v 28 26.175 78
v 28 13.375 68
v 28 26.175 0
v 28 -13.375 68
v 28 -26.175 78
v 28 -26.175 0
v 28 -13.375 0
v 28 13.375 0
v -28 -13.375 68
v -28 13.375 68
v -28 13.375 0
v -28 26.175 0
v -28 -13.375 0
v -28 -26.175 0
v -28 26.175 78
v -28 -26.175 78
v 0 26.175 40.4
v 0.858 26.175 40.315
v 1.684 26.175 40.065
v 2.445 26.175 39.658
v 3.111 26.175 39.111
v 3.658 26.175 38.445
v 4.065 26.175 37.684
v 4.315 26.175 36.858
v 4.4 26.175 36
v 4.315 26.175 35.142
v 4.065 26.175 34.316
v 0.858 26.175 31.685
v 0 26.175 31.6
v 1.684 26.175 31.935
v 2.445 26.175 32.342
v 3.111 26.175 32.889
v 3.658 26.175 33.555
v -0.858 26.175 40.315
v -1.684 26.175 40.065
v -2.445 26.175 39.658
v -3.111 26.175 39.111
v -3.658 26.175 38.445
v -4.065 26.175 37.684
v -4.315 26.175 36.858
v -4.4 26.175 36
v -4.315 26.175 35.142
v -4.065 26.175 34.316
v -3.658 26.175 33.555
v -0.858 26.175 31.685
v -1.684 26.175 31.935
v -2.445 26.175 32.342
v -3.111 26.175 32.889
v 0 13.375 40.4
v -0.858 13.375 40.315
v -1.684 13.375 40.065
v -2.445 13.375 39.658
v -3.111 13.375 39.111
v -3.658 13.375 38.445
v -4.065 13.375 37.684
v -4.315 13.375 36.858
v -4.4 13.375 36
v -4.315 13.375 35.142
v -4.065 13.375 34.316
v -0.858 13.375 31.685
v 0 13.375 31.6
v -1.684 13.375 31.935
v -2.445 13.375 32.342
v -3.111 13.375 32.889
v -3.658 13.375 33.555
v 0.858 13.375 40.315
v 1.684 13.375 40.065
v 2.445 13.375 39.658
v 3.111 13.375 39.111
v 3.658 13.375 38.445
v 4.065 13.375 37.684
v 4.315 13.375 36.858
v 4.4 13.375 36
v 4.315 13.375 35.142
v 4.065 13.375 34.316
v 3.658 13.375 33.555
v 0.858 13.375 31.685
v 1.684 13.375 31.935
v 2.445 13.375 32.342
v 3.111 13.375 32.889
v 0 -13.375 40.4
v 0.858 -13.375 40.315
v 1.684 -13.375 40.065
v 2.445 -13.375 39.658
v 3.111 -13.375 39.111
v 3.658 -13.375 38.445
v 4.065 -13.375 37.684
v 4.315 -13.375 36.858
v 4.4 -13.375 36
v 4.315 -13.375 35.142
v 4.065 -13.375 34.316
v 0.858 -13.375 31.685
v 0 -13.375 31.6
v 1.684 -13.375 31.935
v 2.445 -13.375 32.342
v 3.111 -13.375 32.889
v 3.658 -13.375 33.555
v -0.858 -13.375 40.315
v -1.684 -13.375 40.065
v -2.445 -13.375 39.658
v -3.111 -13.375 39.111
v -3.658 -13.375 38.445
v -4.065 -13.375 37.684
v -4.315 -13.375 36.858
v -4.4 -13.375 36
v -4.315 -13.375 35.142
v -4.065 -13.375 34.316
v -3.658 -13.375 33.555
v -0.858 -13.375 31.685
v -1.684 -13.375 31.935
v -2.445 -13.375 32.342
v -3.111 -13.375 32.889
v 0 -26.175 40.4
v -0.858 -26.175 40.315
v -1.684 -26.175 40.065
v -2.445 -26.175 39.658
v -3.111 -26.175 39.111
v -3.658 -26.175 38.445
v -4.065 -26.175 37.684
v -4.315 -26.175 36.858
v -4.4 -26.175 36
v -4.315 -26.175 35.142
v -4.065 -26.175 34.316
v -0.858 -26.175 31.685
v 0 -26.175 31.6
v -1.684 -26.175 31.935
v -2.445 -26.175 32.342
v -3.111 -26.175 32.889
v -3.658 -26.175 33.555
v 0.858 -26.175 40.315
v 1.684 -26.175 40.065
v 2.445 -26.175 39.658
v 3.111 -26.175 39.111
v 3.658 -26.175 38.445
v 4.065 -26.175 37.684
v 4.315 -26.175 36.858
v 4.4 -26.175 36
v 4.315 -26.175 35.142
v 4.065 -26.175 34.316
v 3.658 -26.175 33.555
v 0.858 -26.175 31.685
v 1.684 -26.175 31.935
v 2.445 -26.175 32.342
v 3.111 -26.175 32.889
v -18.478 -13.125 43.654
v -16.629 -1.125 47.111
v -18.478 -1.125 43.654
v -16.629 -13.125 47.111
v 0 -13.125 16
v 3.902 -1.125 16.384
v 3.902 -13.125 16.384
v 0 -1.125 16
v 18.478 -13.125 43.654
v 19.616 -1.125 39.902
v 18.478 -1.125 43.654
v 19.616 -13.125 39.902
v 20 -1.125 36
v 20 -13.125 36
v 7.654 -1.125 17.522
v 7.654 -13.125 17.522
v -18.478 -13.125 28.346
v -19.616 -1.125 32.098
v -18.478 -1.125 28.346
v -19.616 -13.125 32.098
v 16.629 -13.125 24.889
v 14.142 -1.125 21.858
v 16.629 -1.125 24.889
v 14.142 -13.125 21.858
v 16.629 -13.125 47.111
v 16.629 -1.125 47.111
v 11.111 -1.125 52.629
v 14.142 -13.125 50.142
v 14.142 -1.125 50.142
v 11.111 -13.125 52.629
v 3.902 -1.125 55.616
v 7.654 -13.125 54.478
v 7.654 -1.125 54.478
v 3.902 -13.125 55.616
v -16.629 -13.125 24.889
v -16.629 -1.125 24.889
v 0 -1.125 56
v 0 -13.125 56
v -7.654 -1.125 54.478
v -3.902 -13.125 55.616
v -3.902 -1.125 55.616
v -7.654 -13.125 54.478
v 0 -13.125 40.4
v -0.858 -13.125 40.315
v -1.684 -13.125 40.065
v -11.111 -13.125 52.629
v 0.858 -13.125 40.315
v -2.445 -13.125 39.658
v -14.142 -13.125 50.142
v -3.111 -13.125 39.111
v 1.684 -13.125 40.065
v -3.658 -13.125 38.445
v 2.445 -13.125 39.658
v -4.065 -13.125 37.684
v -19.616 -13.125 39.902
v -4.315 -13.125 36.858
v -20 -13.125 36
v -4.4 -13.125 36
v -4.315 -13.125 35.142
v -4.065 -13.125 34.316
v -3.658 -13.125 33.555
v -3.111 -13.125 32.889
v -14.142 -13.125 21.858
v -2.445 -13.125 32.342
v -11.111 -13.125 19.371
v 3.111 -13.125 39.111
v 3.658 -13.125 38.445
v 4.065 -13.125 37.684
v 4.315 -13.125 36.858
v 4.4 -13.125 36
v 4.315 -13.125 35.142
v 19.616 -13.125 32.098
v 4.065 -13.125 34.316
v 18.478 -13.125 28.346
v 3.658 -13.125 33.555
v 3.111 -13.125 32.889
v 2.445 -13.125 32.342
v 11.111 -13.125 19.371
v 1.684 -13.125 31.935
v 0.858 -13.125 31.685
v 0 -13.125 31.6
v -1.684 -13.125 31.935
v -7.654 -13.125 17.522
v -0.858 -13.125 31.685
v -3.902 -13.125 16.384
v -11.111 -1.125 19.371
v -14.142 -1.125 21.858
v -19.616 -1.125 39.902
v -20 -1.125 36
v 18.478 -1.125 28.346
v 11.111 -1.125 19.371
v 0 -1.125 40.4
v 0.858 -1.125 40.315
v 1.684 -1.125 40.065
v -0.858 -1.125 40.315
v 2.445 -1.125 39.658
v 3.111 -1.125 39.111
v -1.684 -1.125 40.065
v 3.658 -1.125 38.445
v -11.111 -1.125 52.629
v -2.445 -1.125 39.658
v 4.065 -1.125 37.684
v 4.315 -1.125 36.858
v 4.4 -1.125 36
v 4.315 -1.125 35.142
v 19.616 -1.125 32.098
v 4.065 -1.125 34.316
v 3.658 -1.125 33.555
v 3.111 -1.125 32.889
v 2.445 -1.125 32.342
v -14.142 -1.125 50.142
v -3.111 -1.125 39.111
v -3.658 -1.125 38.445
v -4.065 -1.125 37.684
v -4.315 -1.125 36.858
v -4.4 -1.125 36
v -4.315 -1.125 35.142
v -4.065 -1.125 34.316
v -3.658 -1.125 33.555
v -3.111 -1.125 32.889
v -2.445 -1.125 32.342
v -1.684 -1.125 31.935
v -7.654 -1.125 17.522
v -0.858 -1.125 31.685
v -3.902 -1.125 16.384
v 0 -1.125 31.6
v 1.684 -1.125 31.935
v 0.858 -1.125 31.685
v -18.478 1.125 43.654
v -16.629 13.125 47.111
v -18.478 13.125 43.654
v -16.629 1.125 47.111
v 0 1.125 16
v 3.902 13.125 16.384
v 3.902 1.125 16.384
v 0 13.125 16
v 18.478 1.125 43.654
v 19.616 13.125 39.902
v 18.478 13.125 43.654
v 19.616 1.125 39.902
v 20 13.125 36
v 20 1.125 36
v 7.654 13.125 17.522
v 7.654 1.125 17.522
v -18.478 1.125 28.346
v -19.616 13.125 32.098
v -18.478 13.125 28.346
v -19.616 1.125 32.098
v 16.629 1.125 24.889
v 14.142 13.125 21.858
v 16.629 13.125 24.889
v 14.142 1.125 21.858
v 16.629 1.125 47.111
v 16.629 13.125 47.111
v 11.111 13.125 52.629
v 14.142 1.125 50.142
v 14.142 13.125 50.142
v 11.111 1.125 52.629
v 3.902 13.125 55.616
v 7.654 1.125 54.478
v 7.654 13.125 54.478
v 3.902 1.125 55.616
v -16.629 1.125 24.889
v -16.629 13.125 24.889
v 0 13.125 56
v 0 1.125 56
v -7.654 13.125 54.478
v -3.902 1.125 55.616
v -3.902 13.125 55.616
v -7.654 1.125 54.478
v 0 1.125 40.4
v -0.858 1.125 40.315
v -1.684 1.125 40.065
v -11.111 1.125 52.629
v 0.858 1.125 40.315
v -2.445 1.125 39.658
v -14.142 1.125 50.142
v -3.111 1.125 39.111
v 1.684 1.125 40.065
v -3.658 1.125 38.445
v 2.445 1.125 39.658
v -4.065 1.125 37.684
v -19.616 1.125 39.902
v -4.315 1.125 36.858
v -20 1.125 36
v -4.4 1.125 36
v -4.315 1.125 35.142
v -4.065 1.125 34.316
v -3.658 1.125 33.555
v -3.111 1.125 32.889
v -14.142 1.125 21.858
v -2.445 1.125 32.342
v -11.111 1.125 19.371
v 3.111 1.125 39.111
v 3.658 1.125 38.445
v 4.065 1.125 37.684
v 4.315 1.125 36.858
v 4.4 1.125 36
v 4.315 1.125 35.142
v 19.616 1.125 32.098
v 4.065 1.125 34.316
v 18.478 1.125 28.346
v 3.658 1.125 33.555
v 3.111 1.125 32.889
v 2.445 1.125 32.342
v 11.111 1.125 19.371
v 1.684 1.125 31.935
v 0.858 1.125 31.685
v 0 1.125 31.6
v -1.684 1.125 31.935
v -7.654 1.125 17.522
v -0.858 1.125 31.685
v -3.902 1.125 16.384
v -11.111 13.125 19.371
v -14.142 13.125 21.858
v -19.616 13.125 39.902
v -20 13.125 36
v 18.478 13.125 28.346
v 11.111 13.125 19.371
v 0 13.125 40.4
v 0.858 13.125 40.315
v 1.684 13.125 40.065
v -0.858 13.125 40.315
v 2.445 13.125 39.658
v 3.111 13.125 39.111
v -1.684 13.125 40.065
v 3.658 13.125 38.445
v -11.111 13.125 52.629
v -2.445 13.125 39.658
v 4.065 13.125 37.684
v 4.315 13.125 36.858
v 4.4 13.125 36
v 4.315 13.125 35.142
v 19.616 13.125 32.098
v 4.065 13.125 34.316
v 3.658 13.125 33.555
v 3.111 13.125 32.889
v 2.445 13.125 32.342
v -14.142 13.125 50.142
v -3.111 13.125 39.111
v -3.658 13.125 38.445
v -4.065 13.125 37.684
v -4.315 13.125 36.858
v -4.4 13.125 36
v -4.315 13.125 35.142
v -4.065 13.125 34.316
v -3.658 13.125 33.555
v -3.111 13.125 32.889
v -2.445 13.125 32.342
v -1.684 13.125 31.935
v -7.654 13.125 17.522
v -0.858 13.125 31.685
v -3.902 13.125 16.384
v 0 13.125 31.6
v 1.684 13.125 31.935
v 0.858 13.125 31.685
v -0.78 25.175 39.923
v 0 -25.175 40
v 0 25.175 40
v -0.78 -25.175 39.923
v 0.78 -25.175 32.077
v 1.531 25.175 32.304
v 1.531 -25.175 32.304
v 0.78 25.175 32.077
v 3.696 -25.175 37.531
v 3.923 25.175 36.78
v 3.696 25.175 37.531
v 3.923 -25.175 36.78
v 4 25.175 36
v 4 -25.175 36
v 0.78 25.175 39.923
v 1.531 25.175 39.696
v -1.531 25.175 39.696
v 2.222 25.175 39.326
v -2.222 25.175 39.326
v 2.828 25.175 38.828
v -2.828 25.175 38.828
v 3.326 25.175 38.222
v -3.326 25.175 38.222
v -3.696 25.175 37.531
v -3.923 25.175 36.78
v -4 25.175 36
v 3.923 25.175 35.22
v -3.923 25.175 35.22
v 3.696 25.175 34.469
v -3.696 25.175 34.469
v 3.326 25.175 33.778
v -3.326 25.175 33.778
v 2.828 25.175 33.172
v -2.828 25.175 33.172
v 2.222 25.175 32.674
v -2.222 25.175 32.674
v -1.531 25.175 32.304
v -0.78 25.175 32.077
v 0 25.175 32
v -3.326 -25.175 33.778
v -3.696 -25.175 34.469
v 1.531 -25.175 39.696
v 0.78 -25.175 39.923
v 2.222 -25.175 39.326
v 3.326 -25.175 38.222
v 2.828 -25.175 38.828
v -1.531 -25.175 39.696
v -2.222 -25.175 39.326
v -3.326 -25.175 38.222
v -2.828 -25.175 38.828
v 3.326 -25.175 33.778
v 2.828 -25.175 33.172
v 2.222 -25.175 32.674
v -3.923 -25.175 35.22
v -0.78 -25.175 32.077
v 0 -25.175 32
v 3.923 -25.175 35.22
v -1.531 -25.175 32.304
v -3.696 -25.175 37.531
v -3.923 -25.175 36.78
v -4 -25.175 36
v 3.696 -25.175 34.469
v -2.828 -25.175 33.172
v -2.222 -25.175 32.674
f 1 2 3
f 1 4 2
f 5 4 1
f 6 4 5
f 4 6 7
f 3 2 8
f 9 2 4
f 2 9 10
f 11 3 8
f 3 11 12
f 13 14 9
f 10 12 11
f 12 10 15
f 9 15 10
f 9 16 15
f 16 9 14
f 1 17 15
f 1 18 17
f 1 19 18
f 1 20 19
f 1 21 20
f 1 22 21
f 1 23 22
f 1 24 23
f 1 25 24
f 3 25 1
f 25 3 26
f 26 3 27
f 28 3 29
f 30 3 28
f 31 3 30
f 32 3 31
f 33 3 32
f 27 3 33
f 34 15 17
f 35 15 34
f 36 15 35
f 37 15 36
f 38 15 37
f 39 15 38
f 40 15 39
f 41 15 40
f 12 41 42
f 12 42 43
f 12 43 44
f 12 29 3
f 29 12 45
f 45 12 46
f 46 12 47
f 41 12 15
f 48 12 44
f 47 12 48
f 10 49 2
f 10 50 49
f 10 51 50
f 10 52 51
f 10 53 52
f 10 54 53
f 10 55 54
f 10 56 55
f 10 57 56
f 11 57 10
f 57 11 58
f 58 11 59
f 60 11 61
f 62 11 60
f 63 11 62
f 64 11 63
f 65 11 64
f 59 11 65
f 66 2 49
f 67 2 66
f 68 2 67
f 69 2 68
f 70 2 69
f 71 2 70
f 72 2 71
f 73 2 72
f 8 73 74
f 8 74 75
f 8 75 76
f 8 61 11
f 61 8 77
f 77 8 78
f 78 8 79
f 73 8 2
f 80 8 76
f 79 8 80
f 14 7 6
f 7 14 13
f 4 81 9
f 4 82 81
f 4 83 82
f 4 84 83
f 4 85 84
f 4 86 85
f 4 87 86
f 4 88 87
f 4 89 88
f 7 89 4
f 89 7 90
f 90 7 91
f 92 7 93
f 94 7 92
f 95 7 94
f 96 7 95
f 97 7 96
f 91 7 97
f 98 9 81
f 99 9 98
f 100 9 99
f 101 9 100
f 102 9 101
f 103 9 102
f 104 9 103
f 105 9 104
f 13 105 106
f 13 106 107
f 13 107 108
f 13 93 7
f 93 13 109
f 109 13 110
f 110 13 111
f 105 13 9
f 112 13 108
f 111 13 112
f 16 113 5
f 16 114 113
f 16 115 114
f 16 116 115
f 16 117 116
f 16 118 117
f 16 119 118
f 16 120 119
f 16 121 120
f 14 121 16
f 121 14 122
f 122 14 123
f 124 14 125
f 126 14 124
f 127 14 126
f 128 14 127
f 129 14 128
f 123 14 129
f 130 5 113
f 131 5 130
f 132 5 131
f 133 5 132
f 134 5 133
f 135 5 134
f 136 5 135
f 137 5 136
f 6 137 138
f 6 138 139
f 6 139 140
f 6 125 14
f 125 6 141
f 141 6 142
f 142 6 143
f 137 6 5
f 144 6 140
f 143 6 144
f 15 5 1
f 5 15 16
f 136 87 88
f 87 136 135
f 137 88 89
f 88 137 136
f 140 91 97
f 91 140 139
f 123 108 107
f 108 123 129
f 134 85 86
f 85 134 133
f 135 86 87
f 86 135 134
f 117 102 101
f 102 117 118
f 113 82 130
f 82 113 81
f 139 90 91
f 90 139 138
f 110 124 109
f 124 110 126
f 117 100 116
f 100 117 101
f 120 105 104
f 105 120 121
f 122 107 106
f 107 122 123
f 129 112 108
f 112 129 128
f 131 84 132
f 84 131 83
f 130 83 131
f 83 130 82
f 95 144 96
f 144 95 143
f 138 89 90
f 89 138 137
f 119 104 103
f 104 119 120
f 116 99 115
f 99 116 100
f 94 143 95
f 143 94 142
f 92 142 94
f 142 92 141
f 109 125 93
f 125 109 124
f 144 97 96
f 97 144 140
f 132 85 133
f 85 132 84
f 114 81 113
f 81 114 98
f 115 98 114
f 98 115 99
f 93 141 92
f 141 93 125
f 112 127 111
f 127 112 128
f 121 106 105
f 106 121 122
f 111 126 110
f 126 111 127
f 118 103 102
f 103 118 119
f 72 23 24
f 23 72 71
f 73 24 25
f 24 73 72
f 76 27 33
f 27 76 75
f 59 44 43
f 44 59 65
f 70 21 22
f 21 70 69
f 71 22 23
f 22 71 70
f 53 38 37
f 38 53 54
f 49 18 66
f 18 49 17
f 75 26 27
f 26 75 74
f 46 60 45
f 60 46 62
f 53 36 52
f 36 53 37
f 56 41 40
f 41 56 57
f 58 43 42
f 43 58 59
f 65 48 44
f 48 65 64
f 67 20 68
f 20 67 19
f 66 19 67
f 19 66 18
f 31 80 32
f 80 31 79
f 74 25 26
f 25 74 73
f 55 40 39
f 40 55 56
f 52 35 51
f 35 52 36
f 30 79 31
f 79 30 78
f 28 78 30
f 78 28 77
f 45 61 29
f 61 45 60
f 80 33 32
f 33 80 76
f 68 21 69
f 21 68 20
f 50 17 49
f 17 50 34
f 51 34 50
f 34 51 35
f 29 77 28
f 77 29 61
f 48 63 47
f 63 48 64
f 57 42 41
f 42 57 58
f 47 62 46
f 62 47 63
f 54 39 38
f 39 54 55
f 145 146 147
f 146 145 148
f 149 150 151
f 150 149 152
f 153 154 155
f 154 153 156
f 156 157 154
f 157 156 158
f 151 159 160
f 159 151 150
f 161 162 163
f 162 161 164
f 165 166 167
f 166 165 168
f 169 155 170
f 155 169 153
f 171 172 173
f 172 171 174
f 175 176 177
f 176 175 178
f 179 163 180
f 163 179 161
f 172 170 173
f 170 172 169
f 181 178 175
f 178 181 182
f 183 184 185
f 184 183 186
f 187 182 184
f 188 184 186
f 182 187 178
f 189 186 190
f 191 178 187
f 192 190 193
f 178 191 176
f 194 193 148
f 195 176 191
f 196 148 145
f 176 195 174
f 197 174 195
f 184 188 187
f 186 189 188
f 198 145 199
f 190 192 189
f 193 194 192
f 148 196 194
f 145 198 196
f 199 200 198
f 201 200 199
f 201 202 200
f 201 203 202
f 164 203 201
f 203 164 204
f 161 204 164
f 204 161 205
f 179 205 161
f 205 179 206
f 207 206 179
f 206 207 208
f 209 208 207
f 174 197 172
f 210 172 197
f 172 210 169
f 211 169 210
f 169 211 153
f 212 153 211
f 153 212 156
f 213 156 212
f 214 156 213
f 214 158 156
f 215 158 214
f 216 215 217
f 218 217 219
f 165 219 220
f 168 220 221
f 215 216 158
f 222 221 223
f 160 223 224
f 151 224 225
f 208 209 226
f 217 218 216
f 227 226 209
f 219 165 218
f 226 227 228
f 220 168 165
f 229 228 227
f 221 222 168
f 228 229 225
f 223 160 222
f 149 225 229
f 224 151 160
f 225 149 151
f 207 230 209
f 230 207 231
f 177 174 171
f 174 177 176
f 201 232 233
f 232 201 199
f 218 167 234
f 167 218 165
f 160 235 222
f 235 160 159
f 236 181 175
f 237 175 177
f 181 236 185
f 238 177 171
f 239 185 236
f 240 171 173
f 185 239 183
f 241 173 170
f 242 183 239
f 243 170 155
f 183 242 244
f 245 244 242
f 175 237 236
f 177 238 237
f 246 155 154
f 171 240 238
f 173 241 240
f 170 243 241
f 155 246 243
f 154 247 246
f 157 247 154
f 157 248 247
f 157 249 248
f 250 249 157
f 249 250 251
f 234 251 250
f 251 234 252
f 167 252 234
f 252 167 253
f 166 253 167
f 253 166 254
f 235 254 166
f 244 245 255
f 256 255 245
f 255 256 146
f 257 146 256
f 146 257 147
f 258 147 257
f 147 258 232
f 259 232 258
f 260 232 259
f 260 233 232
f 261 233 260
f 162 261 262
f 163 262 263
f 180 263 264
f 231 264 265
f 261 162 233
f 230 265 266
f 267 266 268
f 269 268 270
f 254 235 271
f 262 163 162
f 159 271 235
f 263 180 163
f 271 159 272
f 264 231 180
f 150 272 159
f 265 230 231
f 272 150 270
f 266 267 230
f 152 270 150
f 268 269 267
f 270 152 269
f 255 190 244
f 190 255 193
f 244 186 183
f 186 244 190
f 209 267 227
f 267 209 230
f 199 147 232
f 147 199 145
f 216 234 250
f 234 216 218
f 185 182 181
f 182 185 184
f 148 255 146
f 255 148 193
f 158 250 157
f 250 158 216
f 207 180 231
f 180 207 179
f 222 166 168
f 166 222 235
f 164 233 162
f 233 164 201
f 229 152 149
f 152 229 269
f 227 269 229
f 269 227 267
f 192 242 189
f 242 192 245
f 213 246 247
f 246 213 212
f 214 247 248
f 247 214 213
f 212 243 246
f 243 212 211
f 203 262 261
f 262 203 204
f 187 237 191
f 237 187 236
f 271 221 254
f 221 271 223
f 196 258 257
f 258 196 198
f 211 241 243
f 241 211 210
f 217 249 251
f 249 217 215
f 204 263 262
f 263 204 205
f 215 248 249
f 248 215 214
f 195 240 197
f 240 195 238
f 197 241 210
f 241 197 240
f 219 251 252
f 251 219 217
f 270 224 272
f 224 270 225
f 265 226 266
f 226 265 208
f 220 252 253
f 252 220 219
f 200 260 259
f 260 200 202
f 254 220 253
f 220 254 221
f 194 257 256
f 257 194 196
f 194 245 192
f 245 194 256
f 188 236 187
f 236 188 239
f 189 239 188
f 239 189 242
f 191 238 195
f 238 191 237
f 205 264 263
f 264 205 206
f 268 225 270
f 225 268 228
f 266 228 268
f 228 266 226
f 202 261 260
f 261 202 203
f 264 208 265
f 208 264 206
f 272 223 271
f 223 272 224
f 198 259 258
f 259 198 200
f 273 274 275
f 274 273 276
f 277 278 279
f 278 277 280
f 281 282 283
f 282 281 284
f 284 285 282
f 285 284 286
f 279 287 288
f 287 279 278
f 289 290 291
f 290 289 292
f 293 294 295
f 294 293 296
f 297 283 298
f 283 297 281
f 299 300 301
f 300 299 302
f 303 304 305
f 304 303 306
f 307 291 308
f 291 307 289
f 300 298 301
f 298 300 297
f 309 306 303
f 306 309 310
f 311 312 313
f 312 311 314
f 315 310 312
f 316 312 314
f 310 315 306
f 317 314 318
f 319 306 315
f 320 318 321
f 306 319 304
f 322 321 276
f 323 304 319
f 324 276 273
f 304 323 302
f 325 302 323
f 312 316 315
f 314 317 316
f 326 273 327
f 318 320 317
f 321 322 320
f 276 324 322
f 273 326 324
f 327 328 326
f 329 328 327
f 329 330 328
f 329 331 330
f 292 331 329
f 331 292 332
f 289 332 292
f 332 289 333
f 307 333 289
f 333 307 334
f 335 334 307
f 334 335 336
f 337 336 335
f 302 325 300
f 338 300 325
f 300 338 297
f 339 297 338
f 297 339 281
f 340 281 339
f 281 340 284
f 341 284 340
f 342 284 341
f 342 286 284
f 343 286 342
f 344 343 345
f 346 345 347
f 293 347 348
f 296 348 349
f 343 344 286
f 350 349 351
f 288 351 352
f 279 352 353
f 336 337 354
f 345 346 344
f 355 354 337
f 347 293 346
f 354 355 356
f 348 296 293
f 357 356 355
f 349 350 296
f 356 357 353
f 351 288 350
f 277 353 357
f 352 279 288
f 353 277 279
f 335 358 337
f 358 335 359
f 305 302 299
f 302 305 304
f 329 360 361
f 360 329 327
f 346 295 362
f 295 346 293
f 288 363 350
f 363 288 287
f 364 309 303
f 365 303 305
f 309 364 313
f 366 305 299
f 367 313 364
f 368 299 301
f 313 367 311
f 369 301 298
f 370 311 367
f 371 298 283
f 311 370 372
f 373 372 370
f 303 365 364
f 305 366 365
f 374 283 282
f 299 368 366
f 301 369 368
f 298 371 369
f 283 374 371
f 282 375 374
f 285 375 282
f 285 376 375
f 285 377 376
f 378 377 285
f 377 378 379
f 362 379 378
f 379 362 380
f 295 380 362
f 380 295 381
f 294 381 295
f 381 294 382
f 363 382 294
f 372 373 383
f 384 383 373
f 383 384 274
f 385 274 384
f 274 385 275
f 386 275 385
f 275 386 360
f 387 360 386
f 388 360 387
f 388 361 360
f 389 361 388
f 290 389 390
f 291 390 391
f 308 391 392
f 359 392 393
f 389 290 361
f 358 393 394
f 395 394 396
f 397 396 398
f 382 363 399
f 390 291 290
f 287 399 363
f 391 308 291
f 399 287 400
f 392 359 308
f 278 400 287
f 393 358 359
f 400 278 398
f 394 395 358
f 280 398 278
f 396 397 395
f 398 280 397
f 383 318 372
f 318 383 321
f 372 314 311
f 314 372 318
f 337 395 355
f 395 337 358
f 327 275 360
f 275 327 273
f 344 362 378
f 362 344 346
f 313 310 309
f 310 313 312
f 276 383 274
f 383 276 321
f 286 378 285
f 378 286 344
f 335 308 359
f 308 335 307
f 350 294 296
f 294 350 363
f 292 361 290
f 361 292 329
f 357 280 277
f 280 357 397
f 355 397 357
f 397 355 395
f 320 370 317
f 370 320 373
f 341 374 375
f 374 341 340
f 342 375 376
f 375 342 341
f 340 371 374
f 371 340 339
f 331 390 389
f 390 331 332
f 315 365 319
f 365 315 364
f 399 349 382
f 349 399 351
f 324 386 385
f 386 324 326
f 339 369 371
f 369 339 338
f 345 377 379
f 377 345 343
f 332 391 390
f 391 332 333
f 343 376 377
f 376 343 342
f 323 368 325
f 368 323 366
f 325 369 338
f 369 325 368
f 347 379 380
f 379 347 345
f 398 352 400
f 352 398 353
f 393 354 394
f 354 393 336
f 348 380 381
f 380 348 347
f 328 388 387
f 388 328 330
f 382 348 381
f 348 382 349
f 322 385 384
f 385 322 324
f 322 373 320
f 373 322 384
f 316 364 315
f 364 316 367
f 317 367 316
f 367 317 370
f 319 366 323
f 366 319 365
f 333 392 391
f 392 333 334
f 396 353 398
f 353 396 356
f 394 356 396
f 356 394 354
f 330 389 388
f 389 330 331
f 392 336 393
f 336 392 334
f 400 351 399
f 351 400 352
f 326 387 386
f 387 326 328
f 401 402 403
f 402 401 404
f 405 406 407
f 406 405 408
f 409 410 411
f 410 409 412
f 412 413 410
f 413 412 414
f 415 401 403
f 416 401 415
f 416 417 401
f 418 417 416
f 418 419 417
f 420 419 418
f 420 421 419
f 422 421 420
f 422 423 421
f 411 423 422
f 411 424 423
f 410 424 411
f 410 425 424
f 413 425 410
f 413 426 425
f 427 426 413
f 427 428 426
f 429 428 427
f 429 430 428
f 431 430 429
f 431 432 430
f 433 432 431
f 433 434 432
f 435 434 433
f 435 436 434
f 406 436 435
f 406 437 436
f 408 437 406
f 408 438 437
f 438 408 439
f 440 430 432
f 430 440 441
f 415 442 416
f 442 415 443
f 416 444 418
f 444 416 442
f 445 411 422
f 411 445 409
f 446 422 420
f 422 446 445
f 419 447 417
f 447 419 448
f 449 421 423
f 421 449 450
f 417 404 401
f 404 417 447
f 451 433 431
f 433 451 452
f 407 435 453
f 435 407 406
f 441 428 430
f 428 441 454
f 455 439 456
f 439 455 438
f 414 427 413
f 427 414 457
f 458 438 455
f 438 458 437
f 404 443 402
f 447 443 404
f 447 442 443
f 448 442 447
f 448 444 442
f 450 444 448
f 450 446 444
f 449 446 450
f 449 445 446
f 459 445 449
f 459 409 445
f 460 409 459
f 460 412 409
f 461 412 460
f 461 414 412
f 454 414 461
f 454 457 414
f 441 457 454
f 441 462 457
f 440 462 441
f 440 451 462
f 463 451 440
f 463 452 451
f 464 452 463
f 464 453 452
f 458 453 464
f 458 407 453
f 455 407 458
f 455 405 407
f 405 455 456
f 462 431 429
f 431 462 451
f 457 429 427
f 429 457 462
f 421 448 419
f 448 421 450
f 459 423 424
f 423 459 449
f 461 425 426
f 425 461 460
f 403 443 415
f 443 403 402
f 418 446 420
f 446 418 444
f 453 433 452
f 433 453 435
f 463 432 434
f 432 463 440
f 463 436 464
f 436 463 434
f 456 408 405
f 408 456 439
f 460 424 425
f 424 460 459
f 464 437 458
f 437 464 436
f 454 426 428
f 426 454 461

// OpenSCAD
$fn = 32;

// ------------------------------------------------------------------------
// Trolley wheel set: wheels d40, fork 68 mm tall
// Every part is its own module, assembly() places every instance.
// ------------------------------------------------------------------------

// --- part 1 ---
module trolley_fork() {
  difference() {
    union() {
      translate([-28, 13.375, 0]) cube([56, 12.8, 68]);
      translate([-28, -26.175, 0]) cube([56, 12.8, 68]);
      translate([-28, -26.175, 68]) cube([56, 52.35, 10]);
    }
    translate([0, -19.775, 36]) rotate([90, 0, 0]) cylinder(h = 14.8, d = 8.8, center = true);
    translate([0, 19.775, 36]) rotate([90, 0, 0]) cylinder(h = 14.8, d = 8.8, center = true);
  }
}

// --- part 2 ---
module trolley_wheel() {
  difference() {
      translate([0, 0, 0]) cylinder(h = 12, d = 40);
      translate([0, 0, -1]) cylinder(h = 14, d = 8.8);
    }
}

// --- part 3 ---
module trolley_axle() {
  translate([0, 0, -25.175]) cylinder(h = 50.35, d = 8);
}

// --- assembly ---
module assembly() {
  color([0.80, 0.24, 0.20]) translate([0, 0, 0]) rotate([0, 0, 0]) trolley_fork();
  color([0.20, 0.45, 0.75]) translate([0, -1.125, 36]) rotate([90, 0, 0]) trolley_wheel();
  color([0.25, 0.62, 0.32]) translate([0, 13.125, 36]) rotate([90, 0, 0]) trolley_wheel();
  color([0.92, 0.70, 0.18]) translate([0, 0, 36]) rotate([90, 0, 0]) trolley_axle();
}

assembly();
